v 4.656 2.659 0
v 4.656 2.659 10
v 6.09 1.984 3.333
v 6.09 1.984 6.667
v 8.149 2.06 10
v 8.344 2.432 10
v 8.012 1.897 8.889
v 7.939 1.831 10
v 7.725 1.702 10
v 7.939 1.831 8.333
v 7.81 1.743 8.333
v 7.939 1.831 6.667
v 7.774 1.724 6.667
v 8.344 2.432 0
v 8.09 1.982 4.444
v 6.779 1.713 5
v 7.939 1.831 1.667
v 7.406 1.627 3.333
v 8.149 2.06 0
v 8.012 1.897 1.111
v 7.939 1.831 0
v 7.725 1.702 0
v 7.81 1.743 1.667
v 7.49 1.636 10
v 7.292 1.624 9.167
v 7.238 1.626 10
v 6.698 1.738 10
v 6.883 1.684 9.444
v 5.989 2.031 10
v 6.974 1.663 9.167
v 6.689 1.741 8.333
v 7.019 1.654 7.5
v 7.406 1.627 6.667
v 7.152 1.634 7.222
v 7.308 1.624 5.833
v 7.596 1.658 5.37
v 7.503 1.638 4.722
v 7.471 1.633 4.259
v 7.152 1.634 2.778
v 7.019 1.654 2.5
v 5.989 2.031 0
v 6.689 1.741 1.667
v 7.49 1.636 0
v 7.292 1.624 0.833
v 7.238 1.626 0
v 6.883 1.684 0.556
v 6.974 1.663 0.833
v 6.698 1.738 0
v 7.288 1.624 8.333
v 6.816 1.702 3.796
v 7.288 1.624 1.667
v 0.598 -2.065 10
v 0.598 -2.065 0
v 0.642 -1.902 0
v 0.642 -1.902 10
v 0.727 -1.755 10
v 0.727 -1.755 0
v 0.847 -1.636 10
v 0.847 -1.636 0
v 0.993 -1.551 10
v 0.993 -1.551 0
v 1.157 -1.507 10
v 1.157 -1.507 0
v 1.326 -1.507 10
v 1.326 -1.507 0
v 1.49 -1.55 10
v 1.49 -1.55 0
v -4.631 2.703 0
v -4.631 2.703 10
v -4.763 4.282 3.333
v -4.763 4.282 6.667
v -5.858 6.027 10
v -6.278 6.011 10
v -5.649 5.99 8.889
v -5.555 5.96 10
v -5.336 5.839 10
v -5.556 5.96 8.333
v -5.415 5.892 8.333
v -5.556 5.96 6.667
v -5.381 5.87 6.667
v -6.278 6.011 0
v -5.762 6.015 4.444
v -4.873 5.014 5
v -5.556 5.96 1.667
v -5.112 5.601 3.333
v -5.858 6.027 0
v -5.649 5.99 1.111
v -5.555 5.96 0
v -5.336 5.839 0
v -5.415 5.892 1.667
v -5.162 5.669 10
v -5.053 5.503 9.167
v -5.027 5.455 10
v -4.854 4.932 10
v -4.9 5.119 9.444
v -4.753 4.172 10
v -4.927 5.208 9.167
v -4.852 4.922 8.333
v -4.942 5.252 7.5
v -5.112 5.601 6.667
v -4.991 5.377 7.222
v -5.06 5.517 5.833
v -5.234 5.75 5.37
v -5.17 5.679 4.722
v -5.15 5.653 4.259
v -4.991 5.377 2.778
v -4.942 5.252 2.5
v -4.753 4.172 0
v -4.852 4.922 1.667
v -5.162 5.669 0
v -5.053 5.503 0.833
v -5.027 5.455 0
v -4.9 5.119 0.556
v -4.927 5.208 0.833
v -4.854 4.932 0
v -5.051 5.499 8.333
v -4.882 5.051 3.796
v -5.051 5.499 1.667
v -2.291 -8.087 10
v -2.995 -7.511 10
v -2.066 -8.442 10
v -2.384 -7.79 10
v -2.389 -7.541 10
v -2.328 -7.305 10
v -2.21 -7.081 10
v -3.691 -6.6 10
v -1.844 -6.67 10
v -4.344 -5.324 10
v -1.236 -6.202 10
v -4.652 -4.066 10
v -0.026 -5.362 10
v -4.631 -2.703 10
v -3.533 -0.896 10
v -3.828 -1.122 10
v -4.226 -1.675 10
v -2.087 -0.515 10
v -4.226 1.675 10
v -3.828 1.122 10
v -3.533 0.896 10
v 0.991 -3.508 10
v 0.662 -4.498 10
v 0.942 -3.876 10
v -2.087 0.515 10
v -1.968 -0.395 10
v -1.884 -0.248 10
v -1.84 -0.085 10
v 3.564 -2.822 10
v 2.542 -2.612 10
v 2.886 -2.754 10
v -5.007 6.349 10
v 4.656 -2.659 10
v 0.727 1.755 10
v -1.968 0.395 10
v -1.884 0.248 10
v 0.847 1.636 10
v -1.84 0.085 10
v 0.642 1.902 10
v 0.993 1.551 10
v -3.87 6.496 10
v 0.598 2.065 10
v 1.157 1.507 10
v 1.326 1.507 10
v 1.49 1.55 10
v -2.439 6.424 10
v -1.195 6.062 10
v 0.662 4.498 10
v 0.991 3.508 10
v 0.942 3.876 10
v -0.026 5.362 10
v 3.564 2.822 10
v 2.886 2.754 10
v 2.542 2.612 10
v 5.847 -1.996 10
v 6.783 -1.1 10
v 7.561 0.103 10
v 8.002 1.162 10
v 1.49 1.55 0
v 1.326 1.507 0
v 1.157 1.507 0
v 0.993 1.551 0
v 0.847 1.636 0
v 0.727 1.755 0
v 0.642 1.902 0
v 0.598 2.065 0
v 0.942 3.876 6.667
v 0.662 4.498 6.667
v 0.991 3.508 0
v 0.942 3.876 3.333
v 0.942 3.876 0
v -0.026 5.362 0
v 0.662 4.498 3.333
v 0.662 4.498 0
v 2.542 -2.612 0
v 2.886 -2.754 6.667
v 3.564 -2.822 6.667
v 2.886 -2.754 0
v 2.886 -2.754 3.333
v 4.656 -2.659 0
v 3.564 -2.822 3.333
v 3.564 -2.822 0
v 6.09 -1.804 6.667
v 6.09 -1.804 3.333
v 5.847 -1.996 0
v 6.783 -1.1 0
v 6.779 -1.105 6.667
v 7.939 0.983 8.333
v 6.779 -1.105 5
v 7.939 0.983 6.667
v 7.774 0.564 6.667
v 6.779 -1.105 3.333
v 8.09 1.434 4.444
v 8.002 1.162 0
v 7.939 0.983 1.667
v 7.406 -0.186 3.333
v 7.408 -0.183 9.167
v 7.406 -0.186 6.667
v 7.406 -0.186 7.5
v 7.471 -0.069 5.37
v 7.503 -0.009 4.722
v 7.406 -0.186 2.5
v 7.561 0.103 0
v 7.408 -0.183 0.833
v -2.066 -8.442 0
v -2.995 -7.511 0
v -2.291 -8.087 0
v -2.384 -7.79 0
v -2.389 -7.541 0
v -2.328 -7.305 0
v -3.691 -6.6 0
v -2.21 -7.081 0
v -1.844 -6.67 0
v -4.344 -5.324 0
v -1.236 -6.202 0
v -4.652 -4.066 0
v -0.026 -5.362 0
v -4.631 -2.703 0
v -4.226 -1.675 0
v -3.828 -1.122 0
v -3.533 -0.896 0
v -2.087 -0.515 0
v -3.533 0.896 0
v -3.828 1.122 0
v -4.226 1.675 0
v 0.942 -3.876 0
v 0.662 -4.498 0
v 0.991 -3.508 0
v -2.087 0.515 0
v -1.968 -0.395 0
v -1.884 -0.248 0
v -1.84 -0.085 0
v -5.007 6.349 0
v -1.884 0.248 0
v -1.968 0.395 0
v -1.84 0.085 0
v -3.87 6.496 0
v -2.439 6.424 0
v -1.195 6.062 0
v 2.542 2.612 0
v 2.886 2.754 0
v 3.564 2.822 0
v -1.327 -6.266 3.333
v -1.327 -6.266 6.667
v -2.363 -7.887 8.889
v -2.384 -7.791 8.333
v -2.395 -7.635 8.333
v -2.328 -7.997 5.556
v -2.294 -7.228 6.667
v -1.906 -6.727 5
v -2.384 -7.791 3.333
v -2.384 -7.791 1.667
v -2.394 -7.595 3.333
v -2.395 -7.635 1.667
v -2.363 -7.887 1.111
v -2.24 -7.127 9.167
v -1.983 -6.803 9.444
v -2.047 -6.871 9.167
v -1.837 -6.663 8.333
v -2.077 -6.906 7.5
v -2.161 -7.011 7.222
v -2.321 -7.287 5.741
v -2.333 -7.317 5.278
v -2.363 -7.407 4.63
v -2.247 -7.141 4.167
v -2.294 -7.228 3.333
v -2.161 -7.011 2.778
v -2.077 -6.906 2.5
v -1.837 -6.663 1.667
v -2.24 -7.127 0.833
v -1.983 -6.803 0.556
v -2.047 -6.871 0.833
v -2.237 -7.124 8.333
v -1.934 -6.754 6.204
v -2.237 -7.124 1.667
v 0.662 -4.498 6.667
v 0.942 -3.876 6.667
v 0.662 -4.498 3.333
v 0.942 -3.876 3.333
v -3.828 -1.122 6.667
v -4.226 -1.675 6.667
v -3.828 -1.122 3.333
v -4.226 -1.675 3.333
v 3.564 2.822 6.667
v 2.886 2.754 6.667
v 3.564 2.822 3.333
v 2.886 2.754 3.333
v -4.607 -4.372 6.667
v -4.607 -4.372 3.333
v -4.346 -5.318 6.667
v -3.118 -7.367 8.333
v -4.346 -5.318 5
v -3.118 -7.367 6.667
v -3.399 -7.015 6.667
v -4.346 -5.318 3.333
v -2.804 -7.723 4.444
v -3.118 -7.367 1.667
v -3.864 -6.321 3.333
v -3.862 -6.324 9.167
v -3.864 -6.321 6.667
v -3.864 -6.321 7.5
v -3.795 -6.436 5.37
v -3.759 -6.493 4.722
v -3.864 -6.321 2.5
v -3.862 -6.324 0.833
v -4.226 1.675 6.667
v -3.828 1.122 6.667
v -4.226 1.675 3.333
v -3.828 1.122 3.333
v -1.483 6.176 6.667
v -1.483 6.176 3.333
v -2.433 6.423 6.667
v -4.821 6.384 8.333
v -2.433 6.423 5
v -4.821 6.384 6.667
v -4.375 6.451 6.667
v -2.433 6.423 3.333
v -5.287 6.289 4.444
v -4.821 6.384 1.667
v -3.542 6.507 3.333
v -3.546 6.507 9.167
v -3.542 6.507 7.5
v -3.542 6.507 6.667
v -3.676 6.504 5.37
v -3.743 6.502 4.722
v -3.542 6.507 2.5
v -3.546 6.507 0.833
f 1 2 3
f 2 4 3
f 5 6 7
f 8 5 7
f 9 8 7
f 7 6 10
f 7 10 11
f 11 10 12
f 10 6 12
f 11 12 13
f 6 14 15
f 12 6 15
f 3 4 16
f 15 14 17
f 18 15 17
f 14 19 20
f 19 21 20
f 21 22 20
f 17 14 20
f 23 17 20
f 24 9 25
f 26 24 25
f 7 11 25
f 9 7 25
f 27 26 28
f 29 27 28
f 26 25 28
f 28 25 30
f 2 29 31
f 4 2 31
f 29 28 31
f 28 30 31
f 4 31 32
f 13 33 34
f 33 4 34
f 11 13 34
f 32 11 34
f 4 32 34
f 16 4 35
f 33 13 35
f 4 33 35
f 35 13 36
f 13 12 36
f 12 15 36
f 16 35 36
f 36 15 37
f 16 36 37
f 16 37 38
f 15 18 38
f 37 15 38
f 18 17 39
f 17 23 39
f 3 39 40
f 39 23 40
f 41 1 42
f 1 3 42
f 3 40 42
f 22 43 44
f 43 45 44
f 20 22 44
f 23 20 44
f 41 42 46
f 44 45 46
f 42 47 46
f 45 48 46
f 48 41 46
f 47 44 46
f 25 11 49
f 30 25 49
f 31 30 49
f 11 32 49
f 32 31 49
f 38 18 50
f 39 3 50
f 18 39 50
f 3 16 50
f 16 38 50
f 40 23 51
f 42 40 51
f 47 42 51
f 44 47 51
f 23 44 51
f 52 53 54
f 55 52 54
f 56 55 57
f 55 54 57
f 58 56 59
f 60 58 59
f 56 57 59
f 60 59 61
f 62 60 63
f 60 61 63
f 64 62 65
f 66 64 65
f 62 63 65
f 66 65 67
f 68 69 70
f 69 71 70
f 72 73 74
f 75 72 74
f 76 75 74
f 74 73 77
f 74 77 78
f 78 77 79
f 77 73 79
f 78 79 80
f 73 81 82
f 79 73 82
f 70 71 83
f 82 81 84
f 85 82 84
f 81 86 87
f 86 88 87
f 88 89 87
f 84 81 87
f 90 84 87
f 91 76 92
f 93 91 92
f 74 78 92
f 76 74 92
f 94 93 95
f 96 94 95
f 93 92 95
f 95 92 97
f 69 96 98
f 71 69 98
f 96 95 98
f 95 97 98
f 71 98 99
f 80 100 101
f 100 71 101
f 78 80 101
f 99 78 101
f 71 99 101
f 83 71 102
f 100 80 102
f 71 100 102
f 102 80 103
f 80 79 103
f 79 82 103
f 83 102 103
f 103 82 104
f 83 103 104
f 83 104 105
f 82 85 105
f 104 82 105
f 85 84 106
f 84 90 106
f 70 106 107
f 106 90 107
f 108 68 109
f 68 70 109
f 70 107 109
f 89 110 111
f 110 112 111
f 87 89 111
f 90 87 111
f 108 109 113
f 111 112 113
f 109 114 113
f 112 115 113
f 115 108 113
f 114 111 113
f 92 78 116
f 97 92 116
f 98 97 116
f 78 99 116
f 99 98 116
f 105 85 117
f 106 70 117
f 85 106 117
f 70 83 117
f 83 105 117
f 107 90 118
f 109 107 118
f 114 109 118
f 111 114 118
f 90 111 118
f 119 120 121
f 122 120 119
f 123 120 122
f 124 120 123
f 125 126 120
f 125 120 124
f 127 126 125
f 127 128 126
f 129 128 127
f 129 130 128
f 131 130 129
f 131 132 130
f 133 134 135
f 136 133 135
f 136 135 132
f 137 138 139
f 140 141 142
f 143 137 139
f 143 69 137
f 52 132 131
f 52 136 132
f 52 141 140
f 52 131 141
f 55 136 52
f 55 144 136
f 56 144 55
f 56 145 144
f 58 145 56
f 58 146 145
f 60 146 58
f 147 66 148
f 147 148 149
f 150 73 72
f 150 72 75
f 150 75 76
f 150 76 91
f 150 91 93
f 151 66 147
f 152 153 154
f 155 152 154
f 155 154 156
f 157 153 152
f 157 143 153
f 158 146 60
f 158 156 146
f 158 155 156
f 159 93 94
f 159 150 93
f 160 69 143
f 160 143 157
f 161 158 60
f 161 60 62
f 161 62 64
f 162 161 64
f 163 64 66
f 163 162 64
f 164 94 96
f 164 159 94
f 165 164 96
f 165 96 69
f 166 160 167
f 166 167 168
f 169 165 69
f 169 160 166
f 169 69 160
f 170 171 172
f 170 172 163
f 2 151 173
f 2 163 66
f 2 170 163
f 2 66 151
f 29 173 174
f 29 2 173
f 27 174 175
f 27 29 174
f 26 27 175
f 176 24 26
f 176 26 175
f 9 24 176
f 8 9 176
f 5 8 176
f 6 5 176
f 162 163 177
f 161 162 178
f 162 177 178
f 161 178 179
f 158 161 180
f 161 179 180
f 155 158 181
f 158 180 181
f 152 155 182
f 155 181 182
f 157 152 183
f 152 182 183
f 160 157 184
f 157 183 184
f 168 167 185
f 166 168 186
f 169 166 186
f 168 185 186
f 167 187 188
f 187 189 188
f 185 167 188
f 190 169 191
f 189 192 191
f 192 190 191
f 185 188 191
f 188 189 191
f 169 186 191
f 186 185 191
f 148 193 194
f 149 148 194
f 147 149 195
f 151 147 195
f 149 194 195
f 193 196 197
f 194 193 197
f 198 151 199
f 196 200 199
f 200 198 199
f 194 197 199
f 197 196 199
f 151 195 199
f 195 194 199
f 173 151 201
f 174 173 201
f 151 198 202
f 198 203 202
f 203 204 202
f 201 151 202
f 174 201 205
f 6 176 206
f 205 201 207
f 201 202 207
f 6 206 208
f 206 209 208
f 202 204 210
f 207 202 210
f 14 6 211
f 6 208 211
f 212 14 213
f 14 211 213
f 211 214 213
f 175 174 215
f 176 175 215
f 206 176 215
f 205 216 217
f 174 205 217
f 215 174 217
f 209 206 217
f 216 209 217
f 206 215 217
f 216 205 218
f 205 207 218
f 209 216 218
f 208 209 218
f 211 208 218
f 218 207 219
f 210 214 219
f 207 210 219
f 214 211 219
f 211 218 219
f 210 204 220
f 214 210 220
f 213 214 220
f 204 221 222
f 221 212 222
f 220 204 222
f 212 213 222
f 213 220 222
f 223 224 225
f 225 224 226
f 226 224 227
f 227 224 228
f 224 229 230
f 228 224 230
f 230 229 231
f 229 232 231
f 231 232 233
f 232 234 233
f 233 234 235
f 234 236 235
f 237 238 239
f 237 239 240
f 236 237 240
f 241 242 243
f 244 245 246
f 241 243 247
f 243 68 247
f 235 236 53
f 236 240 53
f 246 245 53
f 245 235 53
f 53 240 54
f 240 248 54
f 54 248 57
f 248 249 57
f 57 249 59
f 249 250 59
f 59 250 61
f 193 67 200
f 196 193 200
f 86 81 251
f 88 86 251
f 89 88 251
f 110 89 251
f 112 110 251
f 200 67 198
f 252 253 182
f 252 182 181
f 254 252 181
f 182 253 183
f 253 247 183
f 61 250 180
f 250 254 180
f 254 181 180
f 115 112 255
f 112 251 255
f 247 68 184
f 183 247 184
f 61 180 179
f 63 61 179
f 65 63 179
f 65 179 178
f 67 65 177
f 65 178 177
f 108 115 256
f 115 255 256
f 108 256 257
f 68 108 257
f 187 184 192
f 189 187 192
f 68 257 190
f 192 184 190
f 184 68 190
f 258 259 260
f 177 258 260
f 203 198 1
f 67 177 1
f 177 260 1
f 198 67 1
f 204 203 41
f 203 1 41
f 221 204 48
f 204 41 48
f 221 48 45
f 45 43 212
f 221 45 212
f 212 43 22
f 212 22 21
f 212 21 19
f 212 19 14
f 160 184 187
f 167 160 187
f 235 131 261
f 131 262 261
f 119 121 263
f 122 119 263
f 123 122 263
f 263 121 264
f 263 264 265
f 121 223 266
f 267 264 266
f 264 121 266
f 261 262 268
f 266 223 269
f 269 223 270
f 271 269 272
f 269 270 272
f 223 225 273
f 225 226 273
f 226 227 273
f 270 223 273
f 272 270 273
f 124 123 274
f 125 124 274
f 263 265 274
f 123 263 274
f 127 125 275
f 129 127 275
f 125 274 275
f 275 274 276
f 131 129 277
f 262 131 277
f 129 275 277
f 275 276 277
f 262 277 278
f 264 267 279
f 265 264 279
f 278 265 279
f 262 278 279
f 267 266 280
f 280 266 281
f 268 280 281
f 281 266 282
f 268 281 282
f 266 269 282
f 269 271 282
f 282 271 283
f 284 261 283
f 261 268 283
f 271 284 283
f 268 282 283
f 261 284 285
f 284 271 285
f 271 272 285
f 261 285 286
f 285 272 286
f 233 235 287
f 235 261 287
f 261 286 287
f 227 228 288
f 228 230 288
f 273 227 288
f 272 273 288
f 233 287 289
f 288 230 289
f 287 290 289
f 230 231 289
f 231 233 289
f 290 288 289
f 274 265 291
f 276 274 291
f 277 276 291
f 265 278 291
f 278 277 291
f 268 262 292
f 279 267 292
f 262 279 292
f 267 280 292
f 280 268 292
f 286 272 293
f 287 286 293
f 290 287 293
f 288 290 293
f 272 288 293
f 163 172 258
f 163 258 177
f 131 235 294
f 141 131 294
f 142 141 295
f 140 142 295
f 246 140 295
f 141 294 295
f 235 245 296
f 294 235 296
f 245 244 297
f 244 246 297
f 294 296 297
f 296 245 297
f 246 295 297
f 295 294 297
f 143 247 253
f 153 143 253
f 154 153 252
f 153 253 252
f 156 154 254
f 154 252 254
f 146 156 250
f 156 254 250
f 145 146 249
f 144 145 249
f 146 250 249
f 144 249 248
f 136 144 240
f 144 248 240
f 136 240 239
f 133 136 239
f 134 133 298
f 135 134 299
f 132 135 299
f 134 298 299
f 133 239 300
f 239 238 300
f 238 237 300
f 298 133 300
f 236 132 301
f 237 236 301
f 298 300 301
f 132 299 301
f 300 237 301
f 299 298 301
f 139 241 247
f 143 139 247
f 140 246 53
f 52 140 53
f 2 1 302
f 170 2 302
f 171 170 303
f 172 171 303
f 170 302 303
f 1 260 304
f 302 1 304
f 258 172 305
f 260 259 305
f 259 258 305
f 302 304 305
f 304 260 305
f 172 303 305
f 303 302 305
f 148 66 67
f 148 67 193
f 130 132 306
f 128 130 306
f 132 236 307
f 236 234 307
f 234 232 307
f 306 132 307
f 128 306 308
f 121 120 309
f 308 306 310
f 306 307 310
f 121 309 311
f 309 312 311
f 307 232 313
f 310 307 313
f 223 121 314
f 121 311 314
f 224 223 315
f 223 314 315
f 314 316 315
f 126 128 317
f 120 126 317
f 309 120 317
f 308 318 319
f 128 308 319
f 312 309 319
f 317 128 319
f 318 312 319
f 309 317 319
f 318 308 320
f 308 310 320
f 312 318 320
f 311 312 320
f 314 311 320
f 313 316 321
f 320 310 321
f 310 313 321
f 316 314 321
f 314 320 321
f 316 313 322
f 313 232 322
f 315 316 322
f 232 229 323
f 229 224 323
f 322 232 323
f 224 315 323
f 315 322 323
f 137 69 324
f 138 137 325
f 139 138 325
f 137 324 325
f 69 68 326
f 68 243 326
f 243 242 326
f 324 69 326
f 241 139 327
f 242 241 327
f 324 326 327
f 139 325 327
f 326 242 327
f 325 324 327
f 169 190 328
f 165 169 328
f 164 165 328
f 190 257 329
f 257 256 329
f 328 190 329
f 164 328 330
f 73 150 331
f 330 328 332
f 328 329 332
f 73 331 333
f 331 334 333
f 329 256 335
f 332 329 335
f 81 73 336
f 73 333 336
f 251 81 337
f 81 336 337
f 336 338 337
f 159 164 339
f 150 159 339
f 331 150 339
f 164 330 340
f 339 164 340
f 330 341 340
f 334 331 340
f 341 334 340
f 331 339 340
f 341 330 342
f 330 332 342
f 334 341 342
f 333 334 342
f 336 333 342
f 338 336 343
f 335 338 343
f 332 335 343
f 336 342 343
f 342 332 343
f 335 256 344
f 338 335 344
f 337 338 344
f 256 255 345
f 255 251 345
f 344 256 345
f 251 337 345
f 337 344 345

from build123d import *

# Parameters (mm, degrees)
PAD_DEPTH = 10


with BuildPart() as part:
    # InvoluteGear → Pad (new body)
    with BuildSketch(Plane.XY):
        with BuildLine():
            Line((1.489546, -1.550404), (2.542216, -2.612039))
            add(Edge.make_bspline(
                [(2.542216, -2.612039), (2.745429, -2.736985), (3.330232, -2.991658), (4.656223, -2.658727)],
                knots=[0, 0, 0, 0, 1, 1, 1, 1], degree=3))
            add(Edge.make_bspline(
                [(4.656223, -2.658727), (6.060271, -2.106027), (7.683483, -0.764768), (8.344372, 2.4318)],
                knots=[0, 0, 0, 0, 1, 1, 1, 1], degree=3))
            add(Edge.make_bspline(
                [(8.344372, 2.4318), (7.683483, 0.764768), (6.060271, 2.106027), (4.656223, 2.658727)],
                knots=[0, 0, 0, 0, 1, 1, 1, 1], degree=3))
            add(Edge.make_bspline(
                [(4.656223, 2.658727), (3.330232, 2.991658), (2.745429, 2.736985), (2.542216, 2.612039)],
                knots=[0, 0, 0, 0, 1, 1, 1, 1], degree=3))
            Line((2.542216, 2.612039), (1.489546, 1.550404))
            ThreePointArc((1.489546, 1.550404), (0.917161, 1.58857), (0.597916, 2.065187))
            Line((0.597916, 2.065187), (0.990984, 3.507643))
            add(Edge.make_bspline(
                [(0.990984, 3.507643), (0.997584, 3.746104), (0.925736, 4.379895), (-0.025587, 5.361771)],
                knots=[0, 0, 0, 0, 1, 1, 1, 1], degree=3))
            add(Edge.make_bspline(
                [(-0.025587, 5.361771), (-1.206262, 6.301362), (-3.179433, 7.036476), (-6.278187, 6.010538)],
                knots=[0, 0, 0, 0, 1, 1, 1, 1], degree=3))
            add(Edge.make_bspline(
                [(-6.278187, 6.010538), (-4.50405, 6.271708), (-4.854008, 4.195335), (-4.630636, 2.703044)],
                knots=[0, 0, 0, 0, 1, 1, 1, 1], degree=3))
            add(Edge.make_bspline(
                [(-4.630636, 2.703044), (-4.255968, 1.388236), (-3.743013, 1.009119), (-3.5332, 0.895604)],
                knots=[0, 0, 0, 0, 1, 1, 1, 1], degree=3))
            Line((-3.5332, 0.895604), (-2.087462, 0.514783))
            ThreePointArc((-2.087462, 0.514783), (-1.834323, 0), (-2.087462, -0.514783))
            Line((-2.087462, -0.514783), (-3.5332, -0.895604))
            add(Edge.make_bspline(
                [(-3.5332, -0.895604), (-3.743013, -1.009119), (-4.255968, -1.388236), (-4.630636, -2.703044)],
                knots=[0, 0, 0, 0, 1, 1, 1, 1], degree=3))
            add(Edge.make_bspline(
                [(-4.630636, -2.703044), (-4.854008, -4.195335), (-4.50405, -6.271708), (-2.066185, -8.442338)],
                knots=[0, 0, 0, 0, 1, 1, 1, 1], degree=3))
            add(Edge.make_bspline(
                [(-2.066185, -8.442338), (-3.179433, -7.036476), (-1.206262, -6.301362), (-0.025587, -5.361771)],
                knots=[0, 0, 0, 0, 1, 1, 1, 1], degree=3))
            add(Edge.make_bspline(
                [(-0.025587, -5.361771), (0.925736, -4.379895), (0.997584, -3.746104), (0.990984, -3.507643)],
                knots=[0, 0, 0, 0, 1, 1, 1, 1], degree=3))
            Line((0.990984, -3.507643), (0.597916, -2.065187))
            ThreePointArc((0.597916, -2.065187), (0.917161, -1.58857), (1.489546, -1.550404))
        make_face()
    extrude(amount=PAD_DEPTH)


solid = part.part
